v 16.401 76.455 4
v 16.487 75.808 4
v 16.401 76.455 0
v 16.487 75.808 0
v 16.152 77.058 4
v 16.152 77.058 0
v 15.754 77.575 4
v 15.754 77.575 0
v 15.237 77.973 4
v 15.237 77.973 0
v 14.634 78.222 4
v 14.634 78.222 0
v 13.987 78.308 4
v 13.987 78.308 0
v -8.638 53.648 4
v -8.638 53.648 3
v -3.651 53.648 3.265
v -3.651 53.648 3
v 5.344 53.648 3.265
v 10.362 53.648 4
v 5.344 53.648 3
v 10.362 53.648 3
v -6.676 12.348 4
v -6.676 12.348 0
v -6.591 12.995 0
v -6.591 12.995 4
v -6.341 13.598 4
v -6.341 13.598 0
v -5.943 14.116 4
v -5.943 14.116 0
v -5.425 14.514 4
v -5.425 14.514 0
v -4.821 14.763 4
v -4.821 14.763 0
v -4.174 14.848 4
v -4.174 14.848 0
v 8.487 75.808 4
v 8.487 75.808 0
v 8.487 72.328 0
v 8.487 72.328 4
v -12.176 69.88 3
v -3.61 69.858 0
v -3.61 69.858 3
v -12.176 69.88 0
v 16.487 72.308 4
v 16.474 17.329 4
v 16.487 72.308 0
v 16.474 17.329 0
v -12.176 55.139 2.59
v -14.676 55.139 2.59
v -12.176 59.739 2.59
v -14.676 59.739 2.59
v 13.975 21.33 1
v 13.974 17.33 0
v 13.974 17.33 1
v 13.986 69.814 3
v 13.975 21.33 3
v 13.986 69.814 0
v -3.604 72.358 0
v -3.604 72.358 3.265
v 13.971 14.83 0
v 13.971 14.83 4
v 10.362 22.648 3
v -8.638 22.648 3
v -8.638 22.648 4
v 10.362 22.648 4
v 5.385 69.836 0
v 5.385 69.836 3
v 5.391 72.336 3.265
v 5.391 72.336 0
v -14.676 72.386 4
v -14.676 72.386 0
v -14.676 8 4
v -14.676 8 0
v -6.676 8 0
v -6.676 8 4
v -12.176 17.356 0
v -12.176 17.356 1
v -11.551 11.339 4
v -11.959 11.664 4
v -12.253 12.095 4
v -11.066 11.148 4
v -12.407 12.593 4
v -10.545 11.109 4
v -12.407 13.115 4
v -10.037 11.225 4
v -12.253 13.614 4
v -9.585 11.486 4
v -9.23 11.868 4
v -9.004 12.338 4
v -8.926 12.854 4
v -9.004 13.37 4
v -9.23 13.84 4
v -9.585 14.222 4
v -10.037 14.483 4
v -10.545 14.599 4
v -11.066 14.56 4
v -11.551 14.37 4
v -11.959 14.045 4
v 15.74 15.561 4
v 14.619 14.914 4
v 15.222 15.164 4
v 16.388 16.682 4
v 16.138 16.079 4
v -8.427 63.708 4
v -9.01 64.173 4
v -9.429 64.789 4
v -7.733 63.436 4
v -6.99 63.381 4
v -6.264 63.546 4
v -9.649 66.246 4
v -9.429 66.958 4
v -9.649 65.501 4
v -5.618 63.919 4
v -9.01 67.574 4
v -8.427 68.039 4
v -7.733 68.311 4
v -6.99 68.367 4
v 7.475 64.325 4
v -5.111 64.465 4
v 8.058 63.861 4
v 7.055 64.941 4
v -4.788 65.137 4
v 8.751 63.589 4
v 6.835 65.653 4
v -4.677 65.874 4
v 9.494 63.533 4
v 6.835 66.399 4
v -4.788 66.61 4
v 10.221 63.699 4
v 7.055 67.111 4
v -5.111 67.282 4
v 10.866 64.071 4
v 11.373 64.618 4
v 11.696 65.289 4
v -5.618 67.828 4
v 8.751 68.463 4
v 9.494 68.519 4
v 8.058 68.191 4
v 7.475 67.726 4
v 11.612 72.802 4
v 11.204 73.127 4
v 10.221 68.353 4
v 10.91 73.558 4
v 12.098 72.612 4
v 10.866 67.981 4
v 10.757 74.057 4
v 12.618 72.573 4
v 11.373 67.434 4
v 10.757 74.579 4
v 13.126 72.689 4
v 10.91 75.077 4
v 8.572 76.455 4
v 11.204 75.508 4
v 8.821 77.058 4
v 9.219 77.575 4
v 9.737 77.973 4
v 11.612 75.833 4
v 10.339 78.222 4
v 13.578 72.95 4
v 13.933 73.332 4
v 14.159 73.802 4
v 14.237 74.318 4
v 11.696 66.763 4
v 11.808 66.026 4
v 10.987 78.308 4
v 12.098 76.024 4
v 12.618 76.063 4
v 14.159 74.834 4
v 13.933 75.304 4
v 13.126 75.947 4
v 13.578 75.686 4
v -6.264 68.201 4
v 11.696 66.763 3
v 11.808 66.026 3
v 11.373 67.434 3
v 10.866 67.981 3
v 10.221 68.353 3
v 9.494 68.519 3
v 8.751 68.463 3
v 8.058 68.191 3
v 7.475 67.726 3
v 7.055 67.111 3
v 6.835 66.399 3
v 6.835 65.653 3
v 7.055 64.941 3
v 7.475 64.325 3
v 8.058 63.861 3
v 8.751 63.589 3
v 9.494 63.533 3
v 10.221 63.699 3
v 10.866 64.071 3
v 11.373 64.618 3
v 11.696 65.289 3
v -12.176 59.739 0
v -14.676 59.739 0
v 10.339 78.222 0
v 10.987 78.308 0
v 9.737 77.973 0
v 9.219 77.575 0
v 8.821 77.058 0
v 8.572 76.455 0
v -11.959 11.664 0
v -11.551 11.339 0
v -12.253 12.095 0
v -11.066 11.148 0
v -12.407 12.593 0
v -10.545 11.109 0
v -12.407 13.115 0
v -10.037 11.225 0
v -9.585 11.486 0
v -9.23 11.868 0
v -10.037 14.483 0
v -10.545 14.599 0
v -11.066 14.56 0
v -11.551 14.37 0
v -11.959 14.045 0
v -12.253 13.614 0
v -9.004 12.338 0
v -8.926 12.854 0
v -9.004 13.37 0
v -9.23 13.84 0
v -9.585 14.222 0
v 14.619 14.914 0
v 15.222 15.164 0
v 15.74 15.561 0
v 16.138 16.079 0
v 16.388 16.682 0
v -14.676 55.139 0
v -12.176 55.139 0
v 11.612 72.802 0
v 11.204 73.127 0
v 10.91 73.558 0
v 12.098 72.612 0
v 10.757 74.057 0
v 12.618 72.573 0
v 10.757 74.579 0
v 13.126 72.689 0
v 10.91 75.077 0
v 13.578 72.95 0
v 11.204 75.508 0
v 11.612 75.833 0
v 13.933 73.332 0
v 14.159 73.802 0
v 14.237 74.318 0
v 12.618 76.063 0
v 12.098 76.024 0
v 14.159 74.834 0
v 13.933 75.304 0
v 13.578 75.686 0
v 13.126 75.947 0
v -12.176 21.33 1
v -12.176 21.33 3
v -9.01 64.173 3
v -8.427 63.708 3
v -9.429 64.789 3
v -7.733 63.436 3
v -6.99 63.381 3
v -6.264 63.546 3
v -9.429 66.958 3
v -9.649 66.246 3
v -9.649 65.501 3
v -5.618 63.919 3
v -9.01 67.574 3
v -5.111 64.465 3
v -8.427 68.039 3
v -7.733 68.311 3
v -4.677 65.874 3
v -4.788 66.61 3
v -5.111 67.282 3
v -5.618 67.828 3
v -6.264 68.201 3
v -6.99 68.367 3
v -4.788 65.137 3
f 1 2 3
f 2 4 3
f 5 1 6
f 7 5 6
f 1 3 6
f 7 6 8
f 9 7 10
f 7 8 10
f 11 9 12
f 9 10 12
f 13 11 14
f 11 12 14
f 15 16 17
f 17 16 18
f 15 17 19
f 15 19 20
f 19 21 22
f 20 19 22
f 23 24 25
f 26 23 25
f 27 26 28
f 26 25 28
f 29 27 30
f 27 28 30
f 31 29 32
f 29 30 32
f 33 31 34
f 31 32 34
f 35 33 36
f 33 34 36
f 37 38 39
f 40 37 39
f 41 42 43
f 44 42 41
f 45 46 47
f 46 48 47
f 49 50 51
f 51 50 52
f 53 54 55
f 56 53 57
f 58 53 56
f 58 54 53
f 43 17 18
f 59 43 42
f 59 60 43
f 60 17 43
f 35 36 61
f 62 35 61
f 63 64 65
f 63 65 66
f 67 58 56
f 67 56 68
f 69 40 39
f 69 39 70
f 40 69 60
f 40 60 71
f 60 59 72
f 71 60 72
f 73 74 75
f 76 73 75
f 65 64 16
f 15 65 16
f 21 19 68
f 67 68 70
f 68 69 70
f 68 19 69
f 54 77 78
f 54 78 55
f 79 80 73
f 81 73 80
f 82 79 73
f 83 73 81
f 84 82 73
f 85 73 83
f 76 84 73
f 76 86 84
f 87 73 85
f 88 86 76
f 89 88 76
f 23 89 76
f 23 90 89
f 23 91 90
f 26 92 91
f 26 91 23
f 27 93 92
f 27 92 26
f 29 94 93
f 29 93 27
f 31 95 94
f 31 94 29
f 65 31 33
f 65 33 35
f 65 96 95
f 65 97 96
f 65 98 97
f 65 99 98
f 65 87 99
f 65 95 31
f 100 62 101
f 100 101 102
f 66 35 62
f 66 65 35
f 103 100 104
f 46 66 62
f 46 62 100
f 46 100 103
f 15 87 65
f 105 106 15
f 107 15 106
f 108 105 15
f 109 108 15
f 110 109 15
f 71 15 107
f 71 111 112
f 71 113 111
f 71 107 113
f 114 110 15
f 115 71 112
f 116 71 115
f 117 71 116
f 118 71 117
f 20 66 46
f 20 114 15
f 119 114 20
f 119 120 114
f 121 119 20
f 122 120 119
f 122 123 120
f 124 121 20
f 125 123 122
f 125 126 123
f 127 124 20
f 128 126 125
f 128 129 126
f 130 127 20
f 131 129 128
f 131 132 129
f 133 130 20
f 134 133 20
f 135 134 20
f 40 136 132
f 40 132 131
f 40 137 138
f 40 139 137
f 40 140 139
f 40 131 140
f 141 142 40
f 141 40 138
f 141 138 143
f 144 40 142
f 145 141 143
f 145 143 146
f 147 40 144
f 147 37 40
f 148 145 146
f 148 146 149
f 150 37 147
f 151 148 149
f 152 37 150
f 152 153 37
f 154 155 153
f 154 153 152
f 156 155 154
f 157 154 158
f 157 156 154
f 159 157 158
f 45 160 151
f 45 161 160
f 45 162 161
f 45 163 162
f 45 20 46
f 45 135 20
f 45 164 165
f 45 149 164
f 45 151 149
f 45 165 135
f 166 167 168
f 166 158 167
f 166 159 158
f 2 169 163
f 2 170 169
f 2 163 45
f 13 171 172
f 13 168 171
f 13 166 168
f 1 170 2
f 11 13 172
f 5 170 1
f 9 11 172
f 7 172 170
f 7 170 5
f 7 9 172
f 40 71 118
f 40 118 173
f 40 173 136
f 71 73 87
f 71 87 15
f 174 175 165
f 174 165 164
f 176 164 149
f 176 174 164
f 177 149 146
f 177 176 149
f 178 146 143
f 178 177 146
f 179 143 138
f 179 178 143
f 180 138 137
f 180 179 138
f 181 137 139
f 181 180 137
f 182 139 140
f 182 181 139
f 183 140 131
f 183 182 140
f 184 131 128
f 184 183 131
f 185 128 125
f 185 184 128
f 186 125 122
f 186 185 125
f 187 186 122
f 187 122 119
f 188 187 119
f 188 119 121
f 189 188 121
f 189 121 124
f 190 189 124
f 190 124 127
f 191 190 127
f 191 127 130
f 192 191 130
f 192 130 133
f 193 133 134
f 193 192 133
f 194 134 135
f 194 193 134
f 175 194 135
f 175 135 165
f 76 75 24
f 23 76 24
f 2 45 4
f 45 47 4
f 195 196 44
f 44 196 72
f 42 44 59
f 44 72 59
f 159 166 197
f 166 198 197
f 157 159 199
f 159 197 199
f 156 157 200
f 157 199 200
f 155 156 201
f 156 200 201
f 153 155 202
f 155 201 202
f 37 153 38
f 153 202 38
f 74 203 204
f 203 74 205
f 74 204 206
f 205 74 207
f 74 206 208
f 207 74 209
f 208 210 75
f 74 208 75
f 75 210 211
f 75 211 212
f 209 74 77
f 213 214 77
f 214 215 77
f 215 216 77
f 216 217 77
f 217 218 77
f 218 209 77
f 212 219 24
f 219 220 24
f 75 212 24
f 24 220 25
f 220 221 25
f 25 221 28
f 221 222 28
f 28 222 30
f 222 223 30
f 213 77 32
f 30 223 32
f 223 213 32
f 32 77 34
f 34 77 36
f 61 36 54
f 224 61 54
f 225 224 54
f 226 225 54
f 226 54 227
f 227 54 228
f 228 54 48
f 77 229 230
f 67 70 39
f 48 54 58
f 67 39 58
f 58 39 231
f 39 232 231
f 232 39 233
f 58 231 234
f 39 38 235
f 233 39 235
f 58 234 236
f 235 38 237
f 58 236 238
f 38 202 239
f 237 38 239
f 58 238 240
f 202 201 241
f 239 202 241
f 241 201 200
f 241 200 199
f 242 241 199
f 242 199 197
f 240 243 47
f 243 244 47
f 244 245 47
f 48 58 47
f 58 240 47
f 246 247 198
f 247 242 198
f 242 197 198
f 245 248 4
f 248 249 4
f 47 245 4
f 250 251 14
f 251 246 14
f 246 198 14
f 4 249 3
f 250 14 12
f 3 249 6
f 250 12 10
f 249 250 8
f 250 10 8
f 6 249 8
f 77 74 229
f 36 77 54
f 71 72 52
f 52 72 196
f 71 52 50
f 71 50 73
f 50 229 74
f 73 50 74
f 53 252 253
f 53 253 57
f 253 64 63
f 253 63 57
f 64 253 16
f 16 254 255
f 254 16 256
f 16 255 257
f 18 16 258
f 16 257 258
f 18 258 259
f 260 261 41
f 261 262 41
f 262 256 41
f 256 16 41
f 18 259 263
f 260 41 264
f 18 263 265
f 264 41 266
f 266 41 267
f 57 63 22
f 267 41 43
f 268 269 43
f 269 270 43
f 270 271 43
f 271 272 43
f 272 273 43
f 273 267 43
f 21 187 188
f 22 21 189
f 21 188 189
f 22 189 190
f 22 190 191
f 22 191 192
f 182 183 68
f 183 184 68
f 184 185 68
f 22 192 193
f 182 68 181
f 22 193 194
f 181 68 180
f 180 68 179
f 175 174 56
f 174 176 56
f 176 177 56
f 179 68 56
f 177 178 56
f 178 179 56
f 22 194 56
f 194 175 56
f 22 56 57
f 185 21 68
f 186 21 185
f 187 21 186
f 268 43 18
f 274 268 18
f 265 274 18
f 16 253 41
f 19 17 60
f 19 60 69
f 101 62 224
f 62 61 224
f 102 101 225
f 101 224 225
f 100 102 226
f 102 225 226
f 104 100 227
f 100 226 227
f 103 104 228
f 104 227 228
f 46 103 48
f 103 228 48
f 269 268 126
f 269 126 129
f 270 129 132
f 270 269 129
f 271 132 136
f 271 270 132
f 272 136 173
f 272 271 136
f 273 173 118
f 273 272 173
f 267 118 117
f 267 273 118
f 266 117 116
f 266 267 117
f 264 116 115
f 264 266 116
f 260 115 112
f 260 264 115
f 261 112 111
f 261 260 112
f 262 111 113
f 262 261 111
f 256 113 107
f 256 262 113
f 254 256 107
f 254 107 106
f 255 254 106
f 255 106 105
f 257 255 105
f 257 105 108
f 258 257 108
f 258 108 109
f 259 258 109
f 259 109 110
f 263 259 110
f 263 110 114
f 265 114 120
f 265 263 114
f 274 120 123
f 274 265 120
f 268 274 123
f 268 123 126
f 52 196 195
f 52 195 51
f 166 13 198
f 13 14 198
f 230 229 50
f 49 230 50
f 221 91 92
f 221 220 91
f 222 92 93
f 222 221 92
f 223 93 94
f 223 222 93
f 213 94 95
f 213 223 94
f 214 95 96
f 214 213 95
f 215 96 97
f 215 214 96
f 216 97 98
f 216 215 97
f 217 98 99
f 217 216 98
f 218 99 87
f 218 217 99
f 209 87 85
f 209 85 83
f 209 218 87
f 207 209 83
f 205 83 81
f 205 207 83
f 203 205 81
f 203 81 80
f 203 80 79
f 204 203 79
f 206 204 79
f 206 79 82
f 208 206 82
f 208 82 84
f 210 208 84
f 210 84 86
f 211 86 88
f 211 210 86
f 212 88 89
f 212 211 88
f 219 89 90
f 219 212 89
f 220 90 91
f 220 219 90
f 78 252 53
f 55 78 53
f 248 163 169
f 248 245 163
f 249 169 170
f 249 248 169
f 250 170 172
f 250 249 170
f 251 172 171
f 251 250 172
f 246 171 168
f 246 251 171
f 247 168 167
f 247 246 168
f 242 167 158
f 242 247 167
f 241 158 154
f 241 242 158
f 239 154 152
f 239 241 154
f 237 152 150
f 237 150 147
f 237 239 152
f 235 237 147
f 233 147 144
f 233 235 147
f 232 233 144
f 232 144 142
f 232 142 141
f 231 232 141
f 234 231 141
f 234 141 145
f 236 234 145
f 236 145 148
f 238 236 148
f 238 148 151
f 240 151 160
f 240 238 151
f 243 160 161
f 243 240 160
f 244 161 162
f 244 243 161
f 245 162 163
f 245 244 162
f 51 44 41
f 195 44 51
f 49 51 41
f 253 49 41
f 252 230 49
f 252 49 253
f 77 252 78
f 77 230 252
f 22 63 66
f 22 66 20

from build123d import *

# Parameters (mm, degrees)
SKETCH1_R           = 1.75
BOSS_EXTRUDE1_DEPTH = 1
SKETCH2_R           = 1.75
BOSS_EXTRUDE2_DEPTH = 2
SKETCH3_R           = 2.5
SKETCH3_R_2         = 1.75
SKETCH3_W           = 19
SKETCH3_H           = 31
BOSS_EXTRUDE3_DEPTH = 1
SKETCH5_W           = 3.6
SKETCH5_H           = 4.6
CUT_EXTRUDE1_DEPTH  = 21
SKETCH6_W           = 8.995193627
SKETCH6_H           = 3.264834395
CUT_EXTRUDE2_DEPTH  = 21


with BuildPart() as part:
    # Sketch1 → Boss-Extrude1 (new body)
    with BuildSketch(Plane.XY):
        with BuildLine():
            Line((-14.676171507, 8), (-6.676171507, 8))
            Line((-6.676171507, 8), (-6.676171507, 12.347767597))
            ThreePointArc((-6.676171507, 12.347767597), (-5.943059576, 14.116412996), (-4.173686267, 14.847766361))
            Line((-4.173686267, 14.847766361), (13.97122522, 14.82972857))
            ThreePointArc((13.97122522, 14.82972857), (15.740392314, 15.560875949), (16.473710392, 17.329144394))
            Line((16.473710392, 17.329144394), (16.486530072, 72.307640303))
            Line((16.486530072, 72.307640303), (16.486530072, 75.807640303))
            ThreePointArc((16.486530072, 75.807640303), (15.754297025, 77.575407256), (13.986530072, 78.307640303))
            Line((13.986530072, 78.307640303), (10.986530072, 78.307640303))
            ThreePointArc((10.986530072, 78.307640303), (9.218763119, 77.575407256), (8.486530072, 75.807640303))
            Line((8.486530072, 75.807640303), (8.486530072, 72.327883256))
            Line((8.486530072, 72.327883256), (-14.676171507, 72.386493441))
            Line((-14.676171507, 72.386493441), (-14.676171507, 8))
        make_face()
        with Locations((12.486998677, 74.317766997)):
            Circle(SKETCH1_R, mode=Mode.SUBTRACT)
        with Locations((-10.676171507, 12.854229471)):
            Circle(SKETCH1_R, mode=Mode.SUBTRACT)
        Polygon((-12.176171507, 17.355722839), (13.97371046, 17.329727334), (13.985948537, 69.813959694), (-12.176171507, 69.880159515), align=None, mode=Mode.SUBTRACT)
    extrude(amount=BOSS_EXTRUDE1_DEPTH)

    # Sketch2 → Boss-Extrude2 (add)
    with BuildSketch(Plane.XY.offset(1)):
        with BuildLine():
            Line((-4.173686267, 14.847766361), (13.97122522, 14.82972857))
            ThreePointArc((13.97122522, 14.82972857), (15.740392314, 15.560875949), (16.473710392, 17.329144394))
            Line((16.473710392, 17.329144394), (16.486530072, 72.307640303))
            Line((16.486530072, 72.307640303), (16.486530072, 75.807640303))
            ThreePointArc((16.486530072, 75.807640303), (15.754297025, 77.575407256), (13.986530072, 78.307640303))
            Line((13.986530072, 78.307640303), (10.986530072, 78.307640303))
            ThreePointArc((10.986530072, 78.307640303), (9.218763119, 77.575407256), (8.486530072, 75.807640303))
            Line((8.486530072, 75.807640303), (8.486530072, 72.327883256))
            Line((8.486530072, 72.327883256), (-14.676171507, 72.386493441))
            Line((-14.676171507, 72.386493441), (-14.676171507, 8))
            Line((-14.676171507, 8), (-6.676171507, 8))
            Line((-6.676171507, 8), (-6.676171507, 12.347767597))
            ThreePointArc((-6.676171507, 12.347767597), (-5.943059576, 14.116412996), (-4.173686267, 14.847766361))
        make_face()
        with Locations((12.486998677, 74.317766997)):
            Circle(SKETCH2_R, mode=Mode.SUBTRACT)
        with Locations((-10.676171507, 12.854229471)):
            Circle(SKETCH2_R, mode=Mode.SUBTRACT)
        Polygon((-12.176171507, 21.330224514), (13.974643281, 21.330224514), (13.985948537, 69.813959694), (-12.176171507, 69.880159515), align=None, mode=Mode.SUBTRACT)
    extrude(amount=BOSS_EXTRUDE2_DEPTH)

    # Sketch3 → Boss-Extrude3 (add)
    with BuildSketch(Plane.XY.offset(3)):
        with BuildLine():
            Line((-4.173686267, 14.847766361), (13.97122522, 14.82972857))
            ThreePointArc((13.97122522, 14.82972857), (15.740392314, 15.560875949), (16.473710392, 17.329144394))
            Line((16.473710392, 17.329144394), (16.486530072, 72.307640303))
            Line((16.486530072, 72.307640303), (16.486530072, 75.807640303))
            ThreePointArc((16.486530072, 75.807640303), (15.754297025, 77.575407256), (13.986530072, 78.307640303))
            Line((13.986530072, 78.307640303), (10.986530072, 78.307640303))
            ThreePointArc((10.986530072, 78.307640303), (9.218763119, 77.575407256), (8.486530072, 75.807640303))
            Line((8.486530072, 75.807640303), (8.486530072, 72.327883256))
            Line((8.486530072, 72.327883256), (-14.676171507, 72.386493441))
            Line((-14.676171507, 72.386493441), (-14.676171507, 8))
            Line((-14.676171507, 8), (-6.676171507, 8))
            Line((-6.676171507, 8), (-6.676171507, 12.347767597))
            ThreePointArc((-6.676171507, 12.347767597), (-5.943059576, 14.116412996), (-4.173686267, 14.847766361))
        make_face()
        with Locations((-7.177066698, 65.873523259)):
            Circle(SKETCH3_R, mode=Mode.SUBTRACT)
        with Locations((9.307529554, 66.02592423)):
            Circle(SKETCH3_R, mode=Mode.SUBTRACT)
        with Locations((12.486998677, 74.317766997)):
            Circle(SKETCH3_R_2, mode=Mode.SUBTRACT)
        with Locations((-10.676171507, 12.854229471)):
            Circle(SKETCH3_R_2, mode=Mode.SUBTRACT)
        with Locations((0.861995575, 38.14822724)):
            Rectangle(SKETCH3_W, SKETCH3_H, mode=Mode.SUBTRACT)
    extrude(amount=BOSS_EXTRUDE3_DEPTH)

    # Sketch5 → Cut-Extrude1 (cut)
    with BuildSketch(Plane.ZY.offset(14.676171507)):
        with Locations((0.78983946, 57.439422967)):
            Rectangle(SKETCH5_W, SKETCH5_H)
    extrude(amount=-CUT_EXTRUDE1_DEPTH, mode=Mode.SUBTRACT)

    # Sketch6 → Cut-Extrude2 (cut)
    with BuildSketch(Plane(origin=(0.183069407, 72.348894077, 0), x_dir=(0.9999967986314592, -0.0025303610084290717, 0), z_dir=(0.0025303610084290713, 0.9999967986314591, 0))):
        with Locations((0.710777389, -1.632417198)):
            Rectangle(SKETCH6_W, SKETCH6_H)
    extrude(amount=-CUT_EXTRUDE2_DEPTH, mode=Mode.SUBTRACT)


solid = part.part
